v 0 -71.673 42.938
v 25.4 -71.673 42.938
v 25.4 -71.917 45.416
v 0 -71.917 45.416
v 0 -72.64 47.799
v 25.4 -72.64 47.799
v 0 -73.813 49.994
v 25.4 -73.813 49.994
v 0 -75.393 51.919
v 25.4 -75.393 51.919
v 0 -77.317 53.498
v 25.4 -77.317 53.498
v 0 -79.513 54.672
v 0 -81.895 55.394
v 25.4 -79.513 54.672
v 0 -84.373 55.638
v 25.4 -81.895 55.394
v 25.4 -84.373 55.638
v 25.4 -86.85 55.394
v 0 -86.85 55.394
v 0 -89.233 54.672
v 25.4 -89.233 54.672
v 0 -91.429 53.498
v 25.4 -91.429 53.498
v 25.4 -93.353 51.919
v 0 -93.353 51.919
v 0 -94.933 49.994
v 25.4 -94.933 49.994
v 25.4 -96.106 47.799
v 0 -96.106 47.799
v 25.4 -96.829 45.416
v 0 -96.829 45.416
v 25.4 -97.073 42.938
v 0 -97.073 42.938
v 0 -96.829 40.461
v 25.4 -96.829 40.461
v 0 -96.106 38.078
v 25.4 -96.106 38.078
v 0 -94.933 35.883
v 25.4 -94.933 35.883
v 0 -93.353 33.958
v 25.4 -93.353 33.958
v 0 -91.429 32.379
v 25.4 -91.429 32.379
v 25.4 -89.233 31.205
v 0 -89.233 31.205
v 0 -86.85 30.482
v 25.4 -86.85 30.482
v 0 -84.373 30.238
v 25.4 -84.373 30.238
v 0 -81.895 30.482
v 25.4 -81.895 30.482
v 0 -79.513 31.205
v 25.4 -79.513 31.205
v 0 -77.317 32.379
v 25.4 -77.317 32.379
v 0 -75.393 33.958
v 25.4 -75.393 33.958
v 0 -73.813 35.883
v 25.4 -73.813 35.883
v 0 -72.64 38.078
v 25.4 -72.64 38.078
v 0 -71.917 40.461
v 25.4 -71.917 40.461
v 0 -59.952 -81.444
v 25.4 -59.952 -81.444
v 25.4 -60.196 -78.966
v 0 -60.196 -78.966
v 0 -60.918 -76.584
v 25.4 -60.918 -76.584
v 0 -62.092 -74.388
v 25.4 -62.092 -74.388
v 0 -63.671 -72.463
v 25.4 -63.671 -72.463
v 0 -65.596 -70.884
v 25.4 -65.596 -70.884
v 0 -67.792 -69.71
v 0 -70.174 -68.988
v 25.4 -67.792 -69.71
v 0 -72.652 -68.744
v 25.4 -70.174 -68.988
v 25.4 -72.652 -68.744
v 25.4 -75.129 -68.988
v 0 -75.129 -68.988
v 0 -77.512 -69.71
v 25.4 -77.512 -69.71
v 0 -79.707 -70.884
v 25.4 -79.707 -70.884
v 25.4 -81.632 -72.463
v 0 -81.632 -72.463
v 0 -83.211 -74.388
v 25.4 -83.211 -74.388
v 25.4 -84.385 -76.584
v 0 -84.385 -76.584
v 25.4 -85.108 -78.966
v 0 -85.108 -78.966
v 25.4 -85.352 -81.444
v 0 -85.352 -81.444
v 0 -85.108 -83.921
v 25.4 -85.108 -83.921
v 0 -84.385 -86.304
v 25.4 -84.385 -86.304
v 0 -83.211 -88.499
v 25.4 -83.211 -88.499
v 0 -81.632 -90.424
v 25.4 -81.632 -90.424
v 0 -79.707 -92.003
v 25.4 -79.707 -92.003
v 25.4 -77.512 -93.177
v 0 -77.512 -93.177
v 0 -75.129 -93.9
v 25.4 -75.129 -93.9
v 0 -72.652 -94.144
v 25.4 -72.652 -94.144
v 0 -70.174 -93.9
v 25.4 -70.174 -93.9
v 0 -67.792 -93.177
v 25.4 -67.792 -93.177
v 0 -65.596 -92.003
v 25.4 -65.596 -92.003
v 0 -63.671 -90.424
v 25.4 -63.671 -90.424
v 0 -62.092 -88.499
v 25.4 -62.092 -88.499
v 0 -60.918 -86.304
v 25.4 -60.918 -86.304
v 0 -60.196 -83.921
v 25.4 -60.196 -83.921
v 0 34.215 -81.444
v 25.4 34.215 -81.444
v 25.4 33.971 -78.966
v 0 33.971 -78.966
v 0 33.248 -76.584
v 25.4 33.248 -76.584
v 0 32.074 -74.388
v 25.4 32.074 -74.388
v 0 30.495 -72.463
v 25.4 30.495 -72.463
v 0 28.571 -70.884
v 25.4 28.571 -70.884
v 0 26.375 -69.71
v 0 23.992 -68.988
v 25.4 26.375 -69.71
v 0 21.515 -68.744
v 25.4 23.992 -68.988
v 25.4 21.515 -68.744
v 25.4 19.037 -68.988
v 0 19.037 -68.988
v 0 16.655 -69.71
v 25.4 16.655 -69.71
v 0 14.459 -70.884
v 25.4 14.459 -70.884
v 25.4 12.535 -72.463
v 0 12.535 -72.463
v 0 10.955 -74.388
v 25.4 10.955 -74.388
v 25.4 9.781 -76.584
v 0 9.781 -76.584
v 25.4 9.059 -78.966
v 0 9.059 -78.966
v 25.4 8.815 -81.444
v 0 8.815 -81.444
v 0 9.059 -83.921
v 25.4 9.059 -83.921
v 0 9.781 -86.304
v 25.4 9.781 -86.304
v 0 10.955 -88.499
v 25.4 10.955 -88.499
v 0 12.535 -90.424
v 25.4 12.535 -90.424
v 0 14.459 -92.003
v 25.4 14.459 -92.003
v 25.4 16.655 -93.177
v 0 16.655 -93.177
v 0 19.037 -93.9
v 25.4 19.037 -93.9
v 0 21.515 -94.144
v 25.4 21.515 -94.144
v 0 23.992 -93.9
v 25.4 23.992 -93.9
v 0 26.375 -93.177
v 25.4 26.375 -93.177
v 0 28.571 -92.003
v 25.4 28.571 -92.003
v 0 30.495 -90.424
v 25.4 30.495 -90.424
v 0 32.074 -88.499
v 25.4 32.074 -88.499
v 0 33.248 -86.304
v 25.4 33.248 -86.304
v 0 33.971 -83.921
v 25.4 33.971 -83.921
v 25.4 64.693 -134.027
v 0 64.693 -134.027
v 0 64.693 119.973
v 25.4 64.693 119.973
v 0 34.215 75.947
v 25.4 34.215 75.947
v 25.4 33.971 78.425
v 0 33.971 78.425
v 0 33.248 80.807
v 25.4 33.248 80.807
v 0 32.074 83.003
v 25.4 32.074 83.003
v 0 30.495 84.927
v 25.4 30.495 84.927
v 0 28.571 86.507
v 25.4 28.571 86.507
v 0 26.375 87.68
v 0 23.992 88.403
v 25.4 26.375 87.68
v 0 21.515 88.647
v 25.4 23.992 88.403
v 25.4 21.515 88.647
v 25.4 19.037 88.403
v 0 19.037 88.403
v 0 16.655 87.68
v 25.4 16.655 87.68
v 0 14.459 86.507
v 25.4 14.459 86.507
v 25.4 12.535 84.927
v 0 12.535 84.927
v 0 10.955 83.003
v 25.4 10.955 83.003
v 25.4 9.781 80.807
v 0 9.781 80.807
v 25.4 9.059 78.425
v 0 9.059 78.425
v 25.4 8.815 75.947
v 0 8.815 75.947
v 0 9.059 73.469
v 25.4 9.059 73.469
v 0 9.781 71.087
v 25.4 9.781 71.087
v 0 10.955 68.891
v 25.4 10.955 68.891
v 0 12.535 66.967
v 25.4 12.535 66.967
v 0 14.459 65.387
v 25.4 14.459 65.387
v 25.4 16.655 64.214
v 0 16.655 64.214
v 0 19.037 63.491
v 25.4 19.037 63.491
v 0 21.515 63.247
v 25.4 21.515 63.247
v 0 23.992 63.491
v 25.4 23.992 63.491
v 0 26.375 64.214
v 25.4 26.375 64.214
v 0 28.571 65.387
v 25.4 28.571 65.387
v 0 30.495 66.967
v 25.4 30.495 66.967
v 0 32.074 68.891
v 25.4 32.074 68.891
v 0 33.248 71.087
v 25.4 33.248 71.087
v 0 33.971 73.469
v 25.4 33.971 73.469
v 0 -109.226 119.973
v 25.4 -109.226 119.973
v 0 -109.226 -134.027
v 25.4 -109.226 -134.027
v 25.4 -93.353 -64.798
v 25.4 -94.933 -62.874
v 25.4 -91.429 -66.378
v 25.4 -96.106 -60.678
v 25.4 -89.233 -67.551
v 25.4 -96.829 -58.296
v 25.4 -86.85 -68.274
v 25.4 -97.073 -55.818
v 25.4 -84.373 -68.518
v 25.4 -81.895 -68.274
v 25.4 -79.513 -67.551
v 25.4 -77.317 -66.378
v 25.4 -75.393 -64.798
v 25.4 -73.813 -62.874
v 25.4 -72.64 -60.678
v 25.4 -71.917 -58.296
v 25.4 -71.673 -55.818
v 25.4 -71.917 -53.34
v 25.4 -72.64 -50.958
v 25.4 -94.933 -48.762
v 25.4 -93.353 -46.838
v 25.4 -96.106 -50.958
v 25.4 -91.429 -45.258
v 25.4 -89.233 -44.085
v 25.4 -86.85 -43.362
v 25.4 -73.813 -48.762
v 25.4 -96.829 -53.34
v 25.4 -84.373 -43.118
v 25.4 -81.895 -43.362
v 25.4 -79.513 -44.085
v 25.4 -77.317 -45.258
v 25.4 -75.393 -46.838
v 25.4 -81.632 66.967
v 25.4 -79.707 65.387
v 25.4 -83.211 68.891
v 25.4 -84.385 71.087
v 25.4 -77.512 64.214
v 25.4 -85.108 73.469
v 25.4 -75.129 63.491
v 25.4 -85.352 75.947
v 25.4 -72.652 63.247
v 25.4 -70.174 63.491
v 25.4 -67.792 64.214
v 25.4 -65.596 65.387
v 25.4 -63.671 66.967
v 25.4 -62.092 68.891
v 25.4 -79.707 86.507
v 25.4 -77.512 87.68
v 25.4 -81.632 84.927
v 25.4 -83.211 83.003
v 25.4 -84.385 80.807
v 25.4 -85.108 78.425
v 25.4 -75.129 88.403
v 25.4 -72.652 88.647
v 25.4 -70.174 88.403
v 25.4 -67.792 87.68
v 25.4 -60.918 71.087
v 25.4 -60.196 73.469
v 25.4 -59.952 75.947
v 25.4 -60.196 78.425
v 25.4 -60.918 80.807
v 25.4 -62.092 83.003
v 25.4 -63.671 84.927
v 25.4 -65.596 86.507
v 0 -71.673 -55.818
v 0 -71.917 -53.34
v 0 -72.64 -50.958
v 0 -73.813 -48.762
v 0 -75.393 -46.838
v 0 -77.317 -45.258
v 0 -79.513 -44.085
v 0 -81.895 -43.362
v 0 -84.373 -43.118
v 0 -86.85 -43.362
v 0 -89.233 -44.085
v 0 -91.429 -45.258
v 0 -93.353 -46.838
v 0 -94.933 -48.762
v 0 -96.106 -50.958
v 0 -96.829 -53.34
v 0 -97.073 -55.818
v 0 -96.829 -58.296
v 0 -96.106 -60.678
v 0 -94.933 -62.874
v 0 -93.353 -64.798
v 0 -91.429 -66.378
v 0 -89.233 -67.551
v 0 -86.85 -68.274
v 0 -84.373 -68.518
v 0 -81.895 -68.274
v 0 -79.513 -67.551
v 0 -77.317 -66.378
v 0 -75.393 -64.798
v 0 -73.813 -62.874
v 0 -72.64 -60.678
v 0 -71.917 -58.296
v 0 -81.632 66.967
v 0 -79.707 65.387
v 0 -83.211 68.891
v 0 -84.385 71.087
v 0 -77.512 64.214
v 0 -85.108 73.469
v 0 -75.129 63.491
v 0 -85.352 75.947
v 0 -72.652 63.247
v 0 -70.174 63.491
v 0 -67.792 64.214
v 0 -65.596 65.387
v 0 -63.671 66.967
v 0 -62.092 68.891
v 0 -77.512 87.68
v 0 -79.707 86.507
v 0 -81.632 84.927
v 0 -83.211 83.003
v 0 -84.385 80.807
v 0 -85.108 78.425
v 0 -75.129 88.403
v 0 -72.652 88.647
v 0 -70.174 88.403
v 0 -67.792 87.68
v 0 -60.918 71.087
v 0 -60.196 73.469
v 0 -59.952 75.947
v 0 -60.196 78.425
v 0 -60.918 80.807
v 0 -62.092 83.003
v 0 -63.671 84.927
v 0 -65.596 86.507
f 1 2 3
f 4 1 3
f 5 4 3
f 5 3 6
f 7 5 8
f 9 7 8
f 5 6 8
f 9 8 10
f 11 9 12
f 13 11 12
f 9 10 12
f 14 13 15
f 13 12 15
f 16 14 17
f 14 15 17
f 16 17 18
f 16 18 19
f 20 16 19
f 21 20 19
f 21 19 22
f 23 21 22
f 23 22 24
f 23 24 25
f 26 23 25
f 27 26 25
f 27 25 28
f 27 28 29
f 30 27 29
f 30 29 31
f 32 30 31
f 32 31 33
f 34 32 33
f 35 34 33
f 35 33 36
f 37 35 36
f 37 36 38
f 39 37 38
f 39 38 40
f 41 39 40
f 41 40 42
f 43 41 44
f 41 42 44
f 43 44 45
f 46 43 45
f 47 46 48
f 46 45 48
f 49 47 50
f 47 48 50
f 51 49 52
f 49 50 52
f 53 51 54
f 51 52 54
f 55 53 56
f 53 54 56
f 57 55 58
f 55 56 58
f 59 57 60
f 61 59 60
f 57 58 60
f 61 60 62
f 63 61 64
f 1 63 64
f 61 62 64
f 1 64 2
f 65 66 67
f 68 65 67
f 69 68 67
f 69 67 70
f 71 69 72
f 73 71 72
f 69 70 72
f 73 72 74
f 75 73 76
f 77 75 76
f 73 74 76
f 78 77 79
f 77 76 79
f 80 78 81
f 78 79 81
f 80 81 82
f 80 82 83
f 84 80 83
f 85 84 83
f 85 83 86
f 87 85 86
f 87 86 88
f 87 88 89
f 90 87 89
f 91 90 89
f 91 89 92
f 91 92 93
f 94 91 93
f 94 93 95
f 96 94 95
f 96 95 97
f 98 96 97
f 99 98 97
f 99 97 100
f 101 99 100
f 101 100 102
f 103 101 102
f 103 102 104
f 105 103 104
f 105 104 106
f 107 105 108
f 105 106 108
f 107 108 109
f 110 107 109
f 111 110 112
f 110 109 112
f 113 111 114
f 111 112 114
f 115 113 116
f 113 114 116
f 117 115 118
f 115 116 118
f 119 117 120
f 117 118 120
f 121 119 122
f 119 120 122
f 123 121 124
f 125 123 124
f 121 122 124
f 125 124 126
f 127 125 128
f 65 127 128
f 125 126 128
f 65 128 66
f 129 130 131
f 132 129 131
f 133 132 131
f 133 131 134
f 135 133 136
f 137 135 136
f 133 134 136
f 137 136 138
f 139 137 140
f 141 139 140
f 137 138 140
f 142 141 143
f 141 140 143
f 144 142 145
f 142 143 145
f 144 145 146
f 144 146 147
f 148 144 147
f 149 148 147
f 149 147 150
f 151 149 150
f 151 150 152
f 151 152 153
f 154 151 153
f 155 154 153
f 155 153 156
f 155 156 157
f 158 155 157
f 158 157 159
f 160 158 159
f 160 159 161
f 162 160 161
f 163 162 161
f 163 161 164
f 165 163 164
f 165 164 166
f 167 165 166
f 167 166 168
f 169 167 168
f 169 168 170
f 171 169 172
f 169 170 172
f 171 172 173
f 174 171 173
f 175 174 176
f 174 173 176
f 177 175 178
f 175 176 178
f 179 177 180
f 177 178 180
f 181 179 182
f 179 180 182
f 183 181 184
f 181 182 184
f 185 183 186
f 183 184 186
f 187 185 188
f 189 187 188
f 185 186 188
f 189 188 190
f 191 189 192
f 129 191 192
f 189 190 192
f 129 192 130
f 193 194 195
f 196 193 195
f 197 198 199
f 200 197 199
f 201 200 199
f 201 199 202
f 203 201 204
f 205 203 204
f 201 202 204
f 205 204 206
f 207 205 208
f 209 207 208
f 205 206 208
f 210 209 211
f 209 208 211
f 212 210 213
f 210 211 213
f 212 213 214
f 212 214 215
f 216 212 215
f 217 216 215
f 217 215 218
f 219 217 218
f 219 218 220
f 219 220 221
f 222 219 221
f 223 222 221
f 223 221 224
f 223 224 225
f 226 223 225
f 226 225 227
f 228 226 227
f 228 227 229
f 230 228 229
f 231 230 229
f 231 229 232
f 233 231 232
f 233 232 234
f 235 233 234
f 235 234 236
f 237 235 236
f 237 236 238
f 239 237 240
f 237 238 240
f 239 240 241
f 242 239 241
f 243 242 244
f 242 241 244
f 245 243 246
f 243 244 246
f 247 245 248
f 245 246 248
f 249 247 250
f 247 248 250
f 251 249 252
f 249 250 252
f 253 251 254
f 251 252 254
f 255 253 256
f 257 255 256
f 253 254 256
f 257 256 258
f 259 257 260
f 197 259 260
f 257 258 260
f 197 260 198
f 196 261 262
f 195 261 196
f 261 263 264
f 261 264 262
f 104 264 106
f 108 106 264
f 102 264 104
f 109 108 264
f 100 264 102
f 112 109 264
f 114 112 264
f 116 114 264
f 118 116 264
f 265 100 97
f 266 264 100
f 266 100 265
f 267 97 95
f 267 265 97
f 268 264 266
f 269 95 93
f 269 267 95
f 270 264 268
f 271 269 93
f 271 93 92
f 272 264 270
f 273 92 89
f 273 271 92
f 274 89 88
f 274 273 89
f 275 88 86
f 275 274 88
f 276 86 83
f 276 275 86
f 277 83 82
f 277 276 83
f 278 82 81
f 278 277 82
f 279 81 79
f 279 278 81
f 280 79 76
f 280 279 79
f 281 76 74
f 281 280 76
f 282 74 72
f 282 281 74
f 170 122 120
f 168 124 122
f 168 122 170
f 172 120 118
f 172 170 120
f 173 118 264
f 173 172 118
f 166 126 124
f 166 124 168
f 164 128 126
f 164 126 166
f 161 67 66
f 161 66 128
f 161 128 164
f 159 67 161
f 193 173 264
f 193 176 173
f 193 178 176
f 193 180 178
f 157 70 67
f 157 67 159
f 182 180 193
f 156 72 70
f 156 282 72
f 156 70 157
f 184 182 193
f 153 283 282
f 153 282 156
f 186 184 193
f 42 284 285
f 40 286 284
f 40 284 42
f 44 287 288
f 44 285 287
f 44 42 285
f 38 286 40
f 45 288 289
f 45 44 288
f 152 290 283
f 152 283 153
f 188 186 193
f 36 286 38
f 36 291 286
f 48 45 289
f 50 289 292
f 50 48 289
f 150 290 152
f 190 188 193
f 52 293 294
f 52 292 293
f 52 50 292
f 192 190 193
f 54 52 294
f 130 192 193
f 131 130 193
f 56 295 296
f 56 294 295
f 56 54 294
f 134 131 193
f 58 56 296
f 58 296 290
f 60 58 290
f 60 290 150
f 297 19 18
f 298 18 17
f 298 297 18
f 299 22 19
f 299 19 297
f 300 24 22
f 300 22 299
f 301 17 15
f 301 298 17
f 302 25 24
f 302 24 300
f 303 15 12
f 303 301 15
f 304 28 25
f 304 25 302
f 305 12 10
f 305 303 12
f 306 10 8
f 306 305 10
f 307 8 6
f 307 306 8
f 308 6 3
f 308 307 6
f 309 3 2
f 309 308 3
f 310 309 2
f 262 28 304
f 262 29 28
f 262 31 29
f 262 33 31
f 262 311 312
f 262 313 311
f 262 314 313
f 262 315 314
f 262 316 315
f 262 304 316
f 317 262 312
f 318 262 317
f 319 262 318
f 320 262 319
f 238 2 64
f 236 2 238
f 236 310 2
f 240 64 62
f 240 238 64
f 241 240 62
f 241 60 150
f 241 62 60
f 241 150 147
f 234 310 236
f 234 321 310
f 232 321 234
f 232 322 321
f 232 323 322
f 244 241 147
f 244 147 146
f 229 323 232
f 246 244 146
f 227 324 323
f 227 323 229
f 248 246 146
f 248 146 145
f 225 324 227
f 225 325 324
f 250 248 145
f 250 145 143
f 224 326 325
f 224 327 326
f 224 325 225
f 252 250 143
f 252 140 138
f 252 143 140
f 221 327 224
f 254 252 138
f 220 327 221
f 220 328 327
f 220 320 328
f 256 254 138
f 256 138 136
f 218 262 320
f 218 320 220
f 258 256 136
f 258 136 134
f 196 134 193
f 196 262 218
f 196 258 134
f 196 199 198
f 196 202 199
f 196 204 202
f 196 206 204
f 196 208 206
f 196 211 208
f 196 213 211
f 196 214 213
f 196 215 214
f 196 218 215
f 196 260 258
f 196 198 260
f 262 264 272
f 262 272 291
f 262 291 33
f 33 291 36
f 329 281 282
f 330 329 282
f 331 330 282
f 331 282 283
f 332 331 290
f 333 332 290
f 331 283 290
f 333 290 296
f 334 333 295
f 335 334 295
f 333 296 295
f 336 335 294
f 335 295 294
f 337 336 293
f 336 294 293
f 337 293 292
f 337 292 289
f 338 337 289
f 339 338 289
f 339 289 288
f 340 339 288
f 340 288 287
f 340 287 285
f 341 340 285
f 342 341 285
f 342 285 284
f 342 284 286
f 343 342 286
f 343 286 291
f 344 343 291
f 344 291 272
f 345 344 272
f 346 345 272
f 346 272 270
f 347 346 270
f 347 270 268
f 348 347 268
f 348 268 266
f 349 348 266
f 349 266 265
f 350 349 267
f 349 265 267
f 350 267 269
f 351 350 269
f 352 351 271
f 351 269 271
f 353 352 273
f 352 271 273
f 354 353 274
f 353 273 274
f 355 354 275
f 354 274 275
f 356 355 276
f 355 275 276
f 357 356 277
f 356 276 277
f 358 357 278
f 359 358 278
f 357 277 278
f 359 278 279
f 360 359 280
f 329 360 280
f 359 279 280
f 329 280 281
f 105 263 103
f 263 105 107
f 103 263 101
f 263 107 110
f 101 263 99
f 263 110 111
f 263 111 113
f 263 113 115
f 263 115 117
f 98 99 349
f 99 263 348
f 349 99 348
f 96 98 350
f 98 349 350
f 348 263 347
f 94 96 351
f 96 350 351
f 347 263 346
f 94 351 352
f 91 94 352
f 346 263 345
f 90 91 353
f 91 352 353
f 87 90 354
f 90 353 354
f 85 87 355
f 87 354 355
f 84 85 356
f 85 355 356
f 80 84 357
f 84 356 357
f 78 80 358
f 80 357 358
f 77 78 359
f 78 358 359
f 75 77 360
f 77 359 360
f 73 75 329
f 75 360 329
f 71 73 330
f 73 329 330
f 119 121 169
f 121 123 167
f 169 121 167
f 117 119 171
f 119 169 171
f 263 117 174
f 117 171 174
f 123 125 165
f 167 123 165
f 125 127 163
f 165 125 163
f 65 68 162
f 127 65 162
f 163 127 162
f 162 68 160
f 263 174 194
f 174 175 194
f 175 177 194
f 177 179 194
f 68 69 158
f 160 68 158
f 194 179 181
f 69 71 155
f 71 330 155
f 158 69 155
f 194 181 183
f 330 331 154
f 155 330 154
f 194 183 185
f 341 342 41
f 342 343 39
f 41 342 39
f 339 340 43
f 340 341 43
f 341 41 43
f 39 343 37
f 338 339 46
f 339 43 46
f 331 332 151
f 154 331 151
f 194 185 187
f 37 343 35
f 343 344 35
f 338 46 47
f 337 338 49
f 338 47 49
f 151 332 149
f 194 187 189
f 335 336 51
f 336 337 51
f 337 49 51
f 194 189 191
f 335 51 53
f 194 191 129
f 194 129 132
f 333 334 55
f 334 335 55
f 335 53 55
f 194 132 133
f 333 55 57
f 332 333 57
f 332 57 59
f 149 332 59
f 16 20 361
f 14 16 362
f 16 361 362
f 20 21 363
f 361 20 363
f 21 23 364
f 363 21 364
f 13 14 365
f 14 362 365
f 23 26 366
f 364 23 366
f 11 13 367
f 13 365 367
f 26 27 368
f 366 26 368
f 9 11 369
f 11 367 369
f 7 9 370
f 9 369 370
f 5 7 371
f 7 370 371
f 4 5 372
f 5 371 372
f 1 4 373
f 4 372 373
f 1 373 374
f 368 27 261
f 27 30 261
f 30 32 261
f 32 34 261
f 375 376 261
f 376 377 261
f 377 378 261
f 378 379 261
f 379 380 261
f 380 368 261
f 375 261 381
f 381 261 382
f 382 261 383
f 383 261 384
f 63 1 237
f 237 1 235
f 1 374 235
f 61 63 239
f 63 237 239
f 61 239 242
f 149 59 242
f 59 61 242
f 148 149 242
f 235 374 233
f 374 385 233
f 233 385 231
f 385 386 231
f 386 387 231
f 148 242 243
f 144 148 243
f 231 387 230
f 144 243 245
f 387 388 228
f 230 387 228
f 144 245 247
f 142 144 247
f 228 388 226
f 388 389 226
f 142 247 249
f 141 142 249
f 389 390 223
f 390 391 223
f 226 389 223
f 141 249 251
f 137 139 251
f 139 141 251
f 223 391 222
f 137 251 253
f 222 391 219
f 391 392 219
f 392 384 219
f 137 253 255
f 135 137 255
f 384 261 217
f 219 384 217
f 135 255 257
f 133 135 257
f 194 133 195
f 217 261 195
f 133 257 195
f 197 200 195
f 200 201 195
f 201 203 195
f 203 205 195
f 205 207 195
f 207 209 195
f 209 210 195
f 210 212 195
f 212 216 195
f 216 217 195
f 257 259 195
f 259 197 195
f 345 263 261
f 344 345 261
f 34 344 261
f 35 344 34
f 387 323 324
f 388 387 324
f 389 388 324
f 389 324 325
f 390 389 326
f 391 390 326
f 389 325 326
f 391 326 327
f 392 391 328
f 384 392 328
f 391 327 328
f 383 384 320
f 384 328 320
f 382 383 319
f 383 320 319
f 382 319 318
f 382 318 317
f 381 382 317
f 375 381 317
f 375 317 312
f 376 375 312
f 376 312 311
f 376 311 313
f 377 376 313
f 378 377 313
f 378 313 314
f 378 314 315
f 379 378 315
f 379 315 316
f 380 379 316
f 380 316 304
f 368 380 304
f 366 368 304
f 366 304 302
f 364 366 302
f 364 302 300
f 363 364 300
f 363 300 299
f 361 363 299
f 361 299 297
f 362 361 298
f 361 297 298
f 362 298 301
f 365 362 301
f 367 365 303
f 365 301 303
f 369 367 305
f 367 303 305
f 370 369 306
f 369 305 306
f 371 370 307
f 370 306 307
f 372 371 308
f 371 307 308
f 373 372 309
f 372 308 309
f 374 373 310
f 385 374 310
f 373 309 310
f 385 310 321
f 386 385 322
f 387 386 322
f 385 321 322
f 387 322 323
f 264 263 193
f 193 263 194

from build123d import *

# Parameters (mm, degrees)
F0_W     = 173.918859
F0_H     = 254
F1_DEPTH = 25.4
F3_D     = 25.4
F5_D     = 25.4


with BuildPart() as f1:
    # F0 (on Right) → F1 (new body)
    with BuildSketch(Plane.YZ):
        with Locations((-22.266922, -7.02697)):
            Rectangle(F0_W, F0_H)
    extrude(amount=F1_DEPTH)

    # F3 (through all)
    with Locations(Plane(origin=(0, 0, 0), x_dir=(0, -1, 0), z_dir=(-1, 0, 0))):
        with Locations((-21.514764, -81.443645), (72.651654, -81.443645), (-21.514764, 75.946935), (72.651654, 75.946935)):
            Hole(F3_D / 2)

    # F5 (through all)
    with Locations(Plane(origin=(0, 0, 0), x_dir=(0, -1, 0), z_dir=(-1, 0, 0))):
        with Locations((84.372841, -55.81788), (84.372841, 42.938467)):
            Hole(F5_D / 2)


solid = f1.part
